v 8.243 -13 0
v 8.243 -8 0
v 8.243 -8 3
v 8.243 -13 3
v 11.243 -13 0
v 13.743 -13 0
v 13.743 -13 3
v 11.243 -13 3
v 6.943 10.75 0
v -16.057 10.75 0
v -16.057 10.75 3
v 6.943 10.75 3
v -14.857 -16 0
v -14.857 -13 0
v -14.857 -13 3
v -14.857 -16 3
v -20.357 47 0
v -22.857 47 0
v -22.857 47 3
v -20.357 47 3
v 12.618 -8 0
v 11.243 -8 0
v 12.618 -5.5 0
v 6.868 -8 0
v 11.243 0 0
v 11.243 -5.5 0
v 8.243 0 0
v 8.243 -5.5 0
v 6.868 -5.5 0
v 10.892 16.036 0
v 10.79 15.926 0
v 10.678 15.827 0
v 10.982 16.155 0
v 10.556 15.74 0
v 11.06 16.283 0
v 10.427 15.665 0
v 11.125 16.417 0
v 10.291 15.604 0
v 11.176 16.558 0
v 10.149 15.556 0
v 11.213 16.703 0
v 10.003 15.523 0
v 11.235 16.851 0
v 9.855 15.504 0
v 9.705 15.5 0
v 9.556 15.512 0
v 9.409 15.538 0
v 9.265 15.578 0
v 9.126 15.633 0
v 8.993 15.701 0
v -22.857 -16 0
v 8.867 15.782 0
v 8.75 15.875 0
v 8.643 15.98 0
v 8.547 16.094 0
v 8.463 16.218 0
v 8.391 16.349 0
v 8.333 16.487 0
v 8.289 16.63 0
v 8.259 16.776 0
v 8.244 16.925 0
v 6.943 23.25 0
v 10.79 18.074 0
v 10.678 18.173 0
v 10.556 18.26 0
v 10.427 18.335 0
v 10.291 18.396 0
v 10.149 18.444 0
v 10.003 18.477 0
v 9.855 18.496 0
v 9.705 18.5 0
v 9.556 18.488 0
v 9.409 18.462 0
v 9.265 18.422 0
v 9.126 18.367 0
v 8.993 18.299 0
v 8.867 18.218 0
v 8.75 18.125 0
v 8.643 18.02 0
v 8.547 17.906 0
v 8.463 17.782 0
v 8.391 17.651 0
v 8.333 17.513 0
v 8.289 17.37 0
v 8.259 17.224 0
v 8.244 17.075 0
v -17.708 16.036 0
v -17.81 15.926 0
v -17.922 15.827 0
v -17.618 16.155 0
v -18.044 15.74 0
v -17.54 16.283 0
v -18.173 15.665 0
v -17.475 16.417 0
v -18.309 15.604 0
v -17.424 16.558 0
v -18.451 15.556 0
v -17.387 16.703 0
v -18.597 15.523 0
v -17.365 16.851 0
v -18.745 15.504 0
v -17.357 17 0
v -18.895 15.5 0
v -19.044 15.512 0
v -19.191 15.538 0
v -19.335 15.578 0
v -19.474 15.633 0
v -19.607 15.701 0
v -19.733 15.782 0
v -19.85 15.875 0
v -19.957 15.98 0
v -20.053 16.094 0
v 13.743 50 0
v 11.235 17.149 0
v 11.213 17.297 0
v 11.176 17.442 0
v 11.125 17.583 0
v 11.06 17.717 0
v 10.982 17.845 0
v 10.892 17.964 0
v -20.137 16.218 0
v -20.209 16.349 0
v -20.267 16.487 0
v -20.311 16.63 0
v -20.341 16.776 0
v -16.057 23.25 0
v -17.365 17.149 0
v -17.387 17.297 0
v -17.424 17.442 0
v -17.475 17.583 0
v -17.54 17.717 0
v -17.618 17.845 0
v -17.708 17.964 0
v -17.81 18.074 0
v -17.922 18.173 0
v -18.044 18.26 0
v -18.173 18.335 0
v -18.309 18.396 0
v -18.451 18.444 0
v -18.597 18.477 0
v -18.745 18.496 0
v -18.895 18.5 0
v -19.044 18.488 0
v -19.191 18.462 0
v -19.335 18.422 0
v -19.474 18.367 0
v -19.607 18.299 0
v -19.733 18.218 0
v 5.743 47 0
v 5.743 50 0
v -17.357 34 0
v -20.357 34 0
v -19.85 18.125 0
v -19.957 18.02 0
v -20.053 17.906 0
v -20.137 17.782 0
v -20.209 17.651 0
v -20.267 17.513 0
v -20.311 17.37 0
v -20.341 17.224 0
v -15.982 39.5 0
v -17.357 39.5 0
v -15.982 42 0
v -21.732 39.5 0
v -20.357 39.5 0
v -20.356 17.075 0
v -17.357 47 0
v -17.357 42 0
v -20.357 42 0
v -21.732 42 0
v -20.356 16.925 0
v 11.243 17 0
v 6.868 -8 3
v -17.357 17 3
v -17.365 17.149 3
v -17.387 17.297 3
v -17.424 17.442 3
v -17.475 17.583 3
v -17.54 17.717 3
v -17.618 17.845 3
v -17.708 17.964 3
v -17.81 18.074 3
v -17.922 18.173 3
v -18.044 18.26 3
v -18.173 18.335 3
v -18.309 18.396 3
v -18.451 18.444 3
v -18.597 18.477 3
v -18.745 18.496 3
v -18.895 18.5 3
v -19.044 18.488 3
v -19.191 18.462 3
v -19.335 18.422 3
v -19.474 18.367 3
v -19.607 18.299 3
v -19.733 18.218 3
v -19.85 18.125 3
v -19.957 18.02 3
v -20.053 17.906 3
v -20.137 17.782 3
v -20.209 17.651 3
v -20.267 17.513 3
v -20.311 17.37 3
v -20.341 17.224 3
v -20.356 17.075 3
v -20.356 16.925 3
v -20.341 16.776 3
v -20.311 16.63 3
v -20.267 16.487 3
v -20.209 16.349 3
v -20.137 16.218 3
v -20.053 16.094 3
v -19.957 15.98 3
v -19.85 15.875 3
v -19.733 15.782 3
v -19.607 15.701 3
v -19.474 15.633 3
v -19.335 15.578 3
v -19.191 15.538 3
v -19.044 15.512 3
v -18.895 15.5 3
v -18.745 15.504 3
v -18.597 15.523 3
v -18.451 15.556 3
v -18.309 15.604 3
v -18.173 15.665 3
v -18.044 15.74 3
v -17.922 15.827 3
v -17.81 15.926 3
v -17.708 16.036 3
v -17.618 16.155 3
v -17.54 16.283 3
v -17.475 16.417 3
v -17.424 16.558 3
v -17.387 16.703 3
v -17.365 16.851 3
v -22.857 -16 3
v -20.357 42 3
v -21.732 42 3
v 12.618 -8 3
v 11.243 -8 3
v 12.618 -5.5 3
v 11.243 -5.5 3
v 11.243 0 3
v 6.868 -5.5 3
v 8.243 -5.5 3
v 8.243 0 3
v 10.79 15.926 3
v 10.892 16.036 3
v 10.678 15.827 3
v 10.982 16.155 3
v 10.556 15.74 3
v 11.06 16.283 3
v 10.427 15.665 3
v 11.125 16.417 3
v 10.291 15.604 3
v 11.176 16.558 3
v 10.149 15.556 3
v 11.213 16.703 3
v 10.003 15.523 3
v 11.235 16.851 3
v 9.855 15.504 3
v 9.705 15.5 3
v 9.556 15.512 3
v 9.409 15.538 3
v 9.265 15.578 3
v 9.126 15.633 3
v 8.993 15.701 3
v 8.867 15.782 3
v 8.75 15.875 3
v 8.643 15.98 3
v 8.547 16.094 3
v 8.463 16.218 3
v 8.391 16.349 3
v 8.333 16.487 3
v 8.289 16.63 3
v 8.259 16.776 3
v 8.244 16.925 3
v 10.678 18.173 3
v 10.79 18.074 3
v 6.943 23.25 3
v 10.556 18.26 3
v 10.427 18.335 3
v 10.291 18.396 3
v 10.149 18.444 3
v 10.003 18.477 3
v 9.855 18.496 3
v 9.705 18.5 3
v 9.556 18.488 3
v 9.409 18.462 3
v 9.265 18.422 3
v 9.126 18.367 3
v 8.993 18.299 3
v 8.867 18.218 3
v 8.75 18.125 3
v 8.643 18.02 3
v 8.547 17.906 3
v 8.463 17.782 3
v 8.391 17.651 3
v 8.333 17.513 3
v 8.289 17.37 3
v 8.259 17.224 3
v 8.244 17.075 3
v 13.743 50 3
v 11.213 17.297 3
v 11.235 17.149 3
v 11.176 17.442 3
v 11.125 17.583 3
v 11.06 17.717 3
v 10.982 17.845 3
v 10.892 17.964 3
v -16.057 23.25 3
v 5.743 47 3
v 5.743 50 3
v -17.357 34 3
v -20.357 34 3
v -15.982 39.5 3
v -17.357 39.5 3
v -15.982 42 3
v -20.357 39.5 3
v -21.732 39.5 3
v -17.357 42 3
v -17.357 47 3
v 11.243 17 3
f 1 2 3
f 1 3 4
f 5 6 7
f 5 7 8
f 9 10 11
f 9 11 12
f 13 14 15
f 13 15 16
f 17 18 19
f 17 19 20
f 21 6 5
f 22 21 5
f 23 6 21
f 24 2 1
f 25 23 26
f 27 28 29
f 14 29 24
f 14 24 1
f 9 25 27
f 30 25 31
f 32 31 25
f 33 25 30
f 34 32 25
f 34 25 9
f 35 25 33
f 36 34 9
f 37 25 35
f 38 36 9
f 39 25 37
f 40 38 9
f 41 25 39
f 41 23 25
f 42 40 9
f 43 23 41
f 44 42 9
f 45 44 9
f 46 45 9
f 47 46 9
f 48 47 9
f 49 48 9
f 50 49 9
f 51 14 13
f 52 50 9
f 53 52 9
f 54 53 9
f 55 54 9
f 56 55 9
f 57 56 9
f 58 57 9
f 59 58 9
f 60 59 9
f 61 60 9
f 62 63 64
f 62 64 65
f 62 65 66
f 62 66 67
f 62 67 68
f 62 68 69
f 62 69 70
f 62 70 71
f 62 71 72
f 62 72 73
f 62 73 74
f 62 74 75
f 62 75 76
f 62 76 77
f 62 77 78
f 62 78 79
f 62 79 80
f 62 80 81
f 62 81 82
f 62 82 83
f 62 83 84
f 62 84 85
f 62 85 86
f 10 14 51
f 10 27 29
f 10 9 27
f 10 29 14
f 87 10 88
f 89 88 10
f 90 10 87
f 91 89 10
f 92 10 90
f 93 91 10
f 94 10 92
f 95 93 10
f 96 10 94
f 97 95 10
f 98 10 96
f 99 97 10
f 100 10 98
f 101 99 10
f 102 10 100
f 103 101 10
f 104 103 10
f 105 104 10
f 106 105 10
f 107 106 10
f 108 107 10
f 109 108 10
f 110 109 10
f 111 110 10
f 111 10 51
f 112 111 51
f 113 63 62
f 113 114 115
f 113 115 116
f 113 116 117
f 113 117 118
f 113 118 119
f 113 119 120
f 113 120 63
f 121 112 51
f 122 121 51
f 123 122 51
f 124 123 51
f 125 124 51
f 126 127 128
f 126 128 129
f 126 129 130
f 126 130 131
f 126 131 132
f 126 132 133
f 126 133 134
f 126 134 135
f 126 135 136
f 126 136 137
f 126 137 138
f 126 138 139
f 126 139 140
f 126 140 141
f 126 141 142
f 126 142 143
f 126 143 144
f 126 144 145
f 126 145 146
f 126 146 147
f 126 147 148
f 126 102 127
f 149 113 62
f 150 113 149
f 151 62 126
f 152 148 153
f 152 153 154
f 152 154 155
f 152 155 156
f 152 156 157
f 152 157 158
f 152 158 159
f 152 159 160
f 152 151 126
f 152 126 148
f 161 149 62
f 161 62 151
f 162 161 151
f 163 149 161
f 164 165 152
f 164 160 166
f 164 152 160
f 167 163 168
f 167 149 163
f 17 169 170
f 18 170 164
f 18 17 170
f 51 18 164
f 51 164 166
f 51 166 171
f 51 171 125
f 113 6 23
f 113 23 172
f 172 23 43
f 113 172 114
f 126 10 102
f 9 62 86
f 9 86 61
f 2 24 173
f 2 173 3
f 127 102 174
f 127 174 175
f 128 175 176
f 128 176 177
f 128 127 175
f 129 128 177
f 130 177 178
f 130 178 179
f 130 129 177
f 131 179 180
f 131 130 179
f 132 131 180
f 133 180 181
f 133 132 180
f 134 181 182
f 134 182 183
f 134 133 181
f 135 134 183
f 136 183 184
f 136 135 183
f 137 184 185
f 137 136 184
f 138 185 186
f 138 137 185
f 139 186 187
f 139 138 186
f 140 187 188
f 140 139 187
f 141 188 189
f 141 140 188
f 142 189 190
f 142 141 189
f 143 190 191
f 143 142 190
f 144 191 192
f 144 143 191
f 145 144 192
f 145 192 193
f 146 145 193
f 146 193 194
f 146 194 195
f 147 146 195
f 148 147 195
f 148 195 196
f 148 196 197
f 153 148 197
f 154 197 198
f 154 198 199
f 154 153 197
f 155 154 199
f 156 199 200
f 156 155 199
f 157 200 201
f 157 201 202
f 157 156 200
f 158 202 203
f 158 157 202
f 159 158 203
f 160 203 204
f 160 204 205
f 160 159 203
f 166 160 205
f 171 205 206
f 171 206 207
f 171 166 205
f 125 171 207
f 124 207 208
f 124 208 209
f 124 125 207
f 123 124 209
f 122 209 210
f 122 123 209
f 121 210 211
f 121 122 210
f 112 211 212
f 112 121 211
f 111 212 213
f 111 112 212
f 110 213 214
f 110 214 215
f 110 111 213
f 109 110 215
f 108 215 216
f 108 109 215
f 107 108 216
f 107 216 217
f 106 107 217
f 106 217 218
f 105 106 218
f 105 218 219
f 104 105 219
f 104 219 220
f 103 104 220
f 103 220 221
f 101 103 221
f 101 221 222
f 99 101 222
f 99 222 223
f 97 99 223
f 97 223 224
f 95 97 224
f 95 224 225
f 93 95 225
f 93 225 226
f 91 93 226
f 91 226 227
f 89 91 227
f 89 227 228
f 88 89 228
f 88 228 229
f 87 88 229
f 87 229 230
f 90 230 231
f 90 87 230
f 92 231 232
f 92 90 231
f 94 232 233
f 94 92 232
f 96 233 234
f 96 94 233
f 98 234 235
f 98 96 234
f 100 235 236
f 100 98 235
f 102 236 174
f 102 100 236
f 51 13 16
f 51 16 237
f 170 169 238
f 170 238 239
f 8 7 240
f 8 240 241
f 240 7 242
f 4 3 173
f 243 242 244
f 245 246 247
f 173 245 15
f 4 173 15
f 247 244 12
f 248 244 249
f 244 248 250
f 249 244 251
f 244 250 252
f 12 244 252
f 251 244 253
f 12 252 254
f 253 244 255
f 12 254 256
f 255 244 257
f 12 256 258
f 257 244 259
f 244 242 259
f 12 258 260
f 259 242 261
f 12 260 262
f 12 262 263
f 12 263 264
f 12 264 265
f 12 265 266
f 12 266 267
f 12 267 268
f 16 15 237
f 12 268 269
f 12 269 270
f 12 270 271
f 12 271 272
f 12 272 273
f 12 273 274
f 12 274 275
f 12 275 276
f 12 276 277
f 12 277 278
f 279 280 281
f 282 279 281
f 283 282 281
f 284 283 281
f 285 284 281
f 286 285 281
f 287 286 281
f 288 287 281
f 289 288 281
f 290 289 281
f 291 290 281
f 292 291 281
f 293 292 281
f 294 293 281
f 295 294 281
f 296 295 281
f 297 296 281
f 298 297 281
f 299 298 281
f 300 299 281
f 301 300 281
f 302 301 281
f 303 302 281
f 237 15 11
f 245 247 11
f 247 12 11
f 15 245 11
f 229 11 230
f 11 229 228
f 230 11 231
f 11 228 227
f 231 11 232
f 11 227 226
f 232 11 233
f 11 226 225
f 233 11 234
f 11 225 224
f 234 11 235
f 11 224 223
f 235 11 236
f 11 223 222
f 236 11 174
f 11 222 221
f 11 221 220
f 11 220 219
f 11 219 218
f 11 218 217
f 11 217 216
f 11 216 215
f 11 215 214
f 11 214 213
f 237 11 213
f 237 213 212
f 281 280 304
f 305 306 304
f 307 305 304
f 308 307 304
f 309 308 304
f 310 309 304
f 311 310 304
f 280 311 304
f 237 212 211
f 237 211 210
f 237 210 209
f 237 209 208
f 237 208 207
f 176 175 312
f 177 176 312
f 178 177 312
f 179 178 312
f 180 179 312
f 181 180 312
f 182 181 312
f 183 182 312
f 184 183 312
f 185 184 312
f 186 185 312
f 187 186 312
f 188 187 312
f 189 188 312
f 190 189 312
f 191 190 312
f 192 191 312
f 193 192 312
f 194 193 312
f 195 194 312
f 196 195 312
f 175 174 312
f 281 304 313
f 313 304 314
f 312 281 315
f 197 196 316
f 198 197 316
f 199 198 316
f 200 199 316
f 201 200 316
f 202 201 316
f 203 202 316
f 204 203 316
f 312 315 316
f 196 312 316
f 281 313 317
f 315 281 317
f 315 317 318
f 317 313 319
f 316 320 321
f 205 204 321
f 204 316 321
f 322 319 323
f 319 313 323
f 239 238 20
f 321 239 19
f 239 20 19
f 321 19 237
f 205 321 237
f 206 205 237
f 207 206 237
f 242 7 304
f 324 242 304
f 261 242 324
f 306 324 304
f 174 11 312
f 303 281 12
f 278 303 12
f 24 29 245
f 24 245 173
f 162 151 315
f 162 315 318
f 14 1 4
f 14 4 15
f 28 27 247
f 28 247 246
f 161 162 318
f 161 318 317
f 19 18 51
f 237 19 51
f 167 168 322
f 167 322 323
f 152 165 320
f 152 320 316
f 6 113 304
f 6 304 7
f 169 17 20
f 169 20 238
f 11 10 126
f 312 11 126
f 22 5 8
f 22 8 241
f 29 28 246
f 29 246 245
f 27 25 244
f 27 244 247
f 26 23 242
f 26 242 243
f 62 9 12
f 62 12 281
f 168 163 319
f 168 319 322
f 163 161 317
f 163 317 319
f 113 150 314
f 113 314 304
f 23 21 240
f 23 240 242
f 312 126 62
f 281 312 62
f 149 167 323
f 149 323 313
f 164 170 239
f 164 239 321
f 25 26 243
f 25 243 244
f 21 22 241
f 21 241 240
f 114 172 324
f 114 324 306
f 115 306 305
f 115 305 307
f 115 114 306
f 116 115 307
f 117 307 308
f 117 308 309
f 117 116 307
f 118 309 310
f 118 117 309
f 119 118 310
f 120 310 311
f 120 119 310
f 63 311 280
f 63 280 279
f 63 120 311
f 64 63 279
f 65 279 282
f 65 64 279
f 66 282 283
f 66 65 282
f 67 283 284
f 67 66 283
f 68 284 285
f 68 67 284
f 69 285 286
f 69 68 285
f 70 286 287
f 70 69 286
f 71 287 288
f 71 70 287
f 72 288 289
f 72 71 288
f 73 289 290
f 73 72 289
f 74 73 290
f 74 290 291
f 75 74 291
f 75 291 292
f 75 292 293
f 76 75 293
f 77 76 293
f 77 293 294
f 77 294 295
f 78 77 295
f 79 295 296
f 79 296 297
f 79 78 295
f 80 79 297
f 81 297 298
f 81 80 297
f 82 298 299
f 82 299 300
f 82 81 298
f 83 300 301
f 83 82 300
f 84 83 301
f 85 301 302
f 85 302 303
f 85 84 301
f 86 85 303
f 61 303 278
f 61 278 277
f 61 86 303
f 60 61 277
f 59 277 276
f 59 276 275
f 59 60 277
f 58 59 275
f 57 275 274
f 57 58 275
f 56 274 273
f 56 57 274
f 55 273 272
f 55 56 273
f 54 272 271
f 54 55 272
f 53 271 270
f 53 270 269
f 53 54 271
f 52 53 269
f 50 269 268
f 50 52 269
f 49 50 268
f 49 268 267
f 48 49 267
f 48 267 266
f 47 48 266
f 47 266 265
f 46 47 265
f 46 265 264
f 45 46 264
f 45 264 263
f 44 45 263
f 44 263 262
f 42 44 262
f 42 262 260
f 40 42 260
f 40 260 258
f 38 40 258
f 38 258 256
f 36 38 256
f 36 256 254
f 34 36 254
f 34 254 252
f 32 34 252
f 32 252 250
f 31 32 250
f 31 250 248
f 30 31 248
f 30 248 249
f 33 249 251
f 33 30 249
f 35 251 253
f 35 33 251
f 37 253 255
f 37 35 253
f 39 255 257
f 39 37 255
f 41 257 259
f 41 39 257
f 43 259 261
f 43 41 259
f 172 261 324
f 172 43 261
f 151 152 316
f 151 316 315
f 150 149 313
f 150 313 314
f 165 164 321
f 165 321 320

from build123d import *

# Parameters (mm, degrees)
ESBO_O1_R                = 1.5
ESBO_O1_W                = 23
ESBO_O1_H                = 12.5
RESSALTO_EXTRUS_O1_DEPTH = 3


with BuildPart() as part:
    # Esboço1 → Ressalto-extrusão1 (new body)
    with BuildSketch(Plane.XY):
        Polygon((11.242500706, -13), (11.242500706, -8), (12.617500706, -8), (12.617500706, -5.5), (11.242500706, -5.5), (11.242500706, 0), (8.242500706, 0), (8.242500706, -5.5), (6.867500706, -5.5), (6.867500706, -8), (8.242500706, -8), (8.242500706, -13), (-14.857499294, -13), (-14.857499294, -16), (-22.857499294, -16), (-22.857499294, -13), (-22.857499294, 25.3), (-22.857499294, 47), (-20.357499294, 47), (-20.357499294, 42), (-21.732499294, 42), (-21.732499294, 39.5), (-20.357499294, 39.5), (-20.357499294, 34), (-17.357499294, 34), (-17.357499294, 39.5), (-15.982499294, 39.5), (-15.982499294, 42), (-17.357499294, 42), (-17.357499294, 47), (5.742500706, 47), (5.742500706, 50), (13.742500706, 50), (13.742500706, -13), align=None)
        with Locations((-18.857499294, 17)):
            Circle(ESBO_O1_R, mode=Mode.SUBTRACT)
        with Locations((9.742500706, 17)):
            Circle(ESBO_O1_R, mode=Mode.SUBTRACT)
        with Locations((-4.557499294, 17)):
            Rectangle(ESBO_O1_W, ESBO_O1_H, mode=Mode.SUBTRACT)
    extrude(amount=RESSALTO_EXTRUS_O1_DEPTH)


solid = part.part
